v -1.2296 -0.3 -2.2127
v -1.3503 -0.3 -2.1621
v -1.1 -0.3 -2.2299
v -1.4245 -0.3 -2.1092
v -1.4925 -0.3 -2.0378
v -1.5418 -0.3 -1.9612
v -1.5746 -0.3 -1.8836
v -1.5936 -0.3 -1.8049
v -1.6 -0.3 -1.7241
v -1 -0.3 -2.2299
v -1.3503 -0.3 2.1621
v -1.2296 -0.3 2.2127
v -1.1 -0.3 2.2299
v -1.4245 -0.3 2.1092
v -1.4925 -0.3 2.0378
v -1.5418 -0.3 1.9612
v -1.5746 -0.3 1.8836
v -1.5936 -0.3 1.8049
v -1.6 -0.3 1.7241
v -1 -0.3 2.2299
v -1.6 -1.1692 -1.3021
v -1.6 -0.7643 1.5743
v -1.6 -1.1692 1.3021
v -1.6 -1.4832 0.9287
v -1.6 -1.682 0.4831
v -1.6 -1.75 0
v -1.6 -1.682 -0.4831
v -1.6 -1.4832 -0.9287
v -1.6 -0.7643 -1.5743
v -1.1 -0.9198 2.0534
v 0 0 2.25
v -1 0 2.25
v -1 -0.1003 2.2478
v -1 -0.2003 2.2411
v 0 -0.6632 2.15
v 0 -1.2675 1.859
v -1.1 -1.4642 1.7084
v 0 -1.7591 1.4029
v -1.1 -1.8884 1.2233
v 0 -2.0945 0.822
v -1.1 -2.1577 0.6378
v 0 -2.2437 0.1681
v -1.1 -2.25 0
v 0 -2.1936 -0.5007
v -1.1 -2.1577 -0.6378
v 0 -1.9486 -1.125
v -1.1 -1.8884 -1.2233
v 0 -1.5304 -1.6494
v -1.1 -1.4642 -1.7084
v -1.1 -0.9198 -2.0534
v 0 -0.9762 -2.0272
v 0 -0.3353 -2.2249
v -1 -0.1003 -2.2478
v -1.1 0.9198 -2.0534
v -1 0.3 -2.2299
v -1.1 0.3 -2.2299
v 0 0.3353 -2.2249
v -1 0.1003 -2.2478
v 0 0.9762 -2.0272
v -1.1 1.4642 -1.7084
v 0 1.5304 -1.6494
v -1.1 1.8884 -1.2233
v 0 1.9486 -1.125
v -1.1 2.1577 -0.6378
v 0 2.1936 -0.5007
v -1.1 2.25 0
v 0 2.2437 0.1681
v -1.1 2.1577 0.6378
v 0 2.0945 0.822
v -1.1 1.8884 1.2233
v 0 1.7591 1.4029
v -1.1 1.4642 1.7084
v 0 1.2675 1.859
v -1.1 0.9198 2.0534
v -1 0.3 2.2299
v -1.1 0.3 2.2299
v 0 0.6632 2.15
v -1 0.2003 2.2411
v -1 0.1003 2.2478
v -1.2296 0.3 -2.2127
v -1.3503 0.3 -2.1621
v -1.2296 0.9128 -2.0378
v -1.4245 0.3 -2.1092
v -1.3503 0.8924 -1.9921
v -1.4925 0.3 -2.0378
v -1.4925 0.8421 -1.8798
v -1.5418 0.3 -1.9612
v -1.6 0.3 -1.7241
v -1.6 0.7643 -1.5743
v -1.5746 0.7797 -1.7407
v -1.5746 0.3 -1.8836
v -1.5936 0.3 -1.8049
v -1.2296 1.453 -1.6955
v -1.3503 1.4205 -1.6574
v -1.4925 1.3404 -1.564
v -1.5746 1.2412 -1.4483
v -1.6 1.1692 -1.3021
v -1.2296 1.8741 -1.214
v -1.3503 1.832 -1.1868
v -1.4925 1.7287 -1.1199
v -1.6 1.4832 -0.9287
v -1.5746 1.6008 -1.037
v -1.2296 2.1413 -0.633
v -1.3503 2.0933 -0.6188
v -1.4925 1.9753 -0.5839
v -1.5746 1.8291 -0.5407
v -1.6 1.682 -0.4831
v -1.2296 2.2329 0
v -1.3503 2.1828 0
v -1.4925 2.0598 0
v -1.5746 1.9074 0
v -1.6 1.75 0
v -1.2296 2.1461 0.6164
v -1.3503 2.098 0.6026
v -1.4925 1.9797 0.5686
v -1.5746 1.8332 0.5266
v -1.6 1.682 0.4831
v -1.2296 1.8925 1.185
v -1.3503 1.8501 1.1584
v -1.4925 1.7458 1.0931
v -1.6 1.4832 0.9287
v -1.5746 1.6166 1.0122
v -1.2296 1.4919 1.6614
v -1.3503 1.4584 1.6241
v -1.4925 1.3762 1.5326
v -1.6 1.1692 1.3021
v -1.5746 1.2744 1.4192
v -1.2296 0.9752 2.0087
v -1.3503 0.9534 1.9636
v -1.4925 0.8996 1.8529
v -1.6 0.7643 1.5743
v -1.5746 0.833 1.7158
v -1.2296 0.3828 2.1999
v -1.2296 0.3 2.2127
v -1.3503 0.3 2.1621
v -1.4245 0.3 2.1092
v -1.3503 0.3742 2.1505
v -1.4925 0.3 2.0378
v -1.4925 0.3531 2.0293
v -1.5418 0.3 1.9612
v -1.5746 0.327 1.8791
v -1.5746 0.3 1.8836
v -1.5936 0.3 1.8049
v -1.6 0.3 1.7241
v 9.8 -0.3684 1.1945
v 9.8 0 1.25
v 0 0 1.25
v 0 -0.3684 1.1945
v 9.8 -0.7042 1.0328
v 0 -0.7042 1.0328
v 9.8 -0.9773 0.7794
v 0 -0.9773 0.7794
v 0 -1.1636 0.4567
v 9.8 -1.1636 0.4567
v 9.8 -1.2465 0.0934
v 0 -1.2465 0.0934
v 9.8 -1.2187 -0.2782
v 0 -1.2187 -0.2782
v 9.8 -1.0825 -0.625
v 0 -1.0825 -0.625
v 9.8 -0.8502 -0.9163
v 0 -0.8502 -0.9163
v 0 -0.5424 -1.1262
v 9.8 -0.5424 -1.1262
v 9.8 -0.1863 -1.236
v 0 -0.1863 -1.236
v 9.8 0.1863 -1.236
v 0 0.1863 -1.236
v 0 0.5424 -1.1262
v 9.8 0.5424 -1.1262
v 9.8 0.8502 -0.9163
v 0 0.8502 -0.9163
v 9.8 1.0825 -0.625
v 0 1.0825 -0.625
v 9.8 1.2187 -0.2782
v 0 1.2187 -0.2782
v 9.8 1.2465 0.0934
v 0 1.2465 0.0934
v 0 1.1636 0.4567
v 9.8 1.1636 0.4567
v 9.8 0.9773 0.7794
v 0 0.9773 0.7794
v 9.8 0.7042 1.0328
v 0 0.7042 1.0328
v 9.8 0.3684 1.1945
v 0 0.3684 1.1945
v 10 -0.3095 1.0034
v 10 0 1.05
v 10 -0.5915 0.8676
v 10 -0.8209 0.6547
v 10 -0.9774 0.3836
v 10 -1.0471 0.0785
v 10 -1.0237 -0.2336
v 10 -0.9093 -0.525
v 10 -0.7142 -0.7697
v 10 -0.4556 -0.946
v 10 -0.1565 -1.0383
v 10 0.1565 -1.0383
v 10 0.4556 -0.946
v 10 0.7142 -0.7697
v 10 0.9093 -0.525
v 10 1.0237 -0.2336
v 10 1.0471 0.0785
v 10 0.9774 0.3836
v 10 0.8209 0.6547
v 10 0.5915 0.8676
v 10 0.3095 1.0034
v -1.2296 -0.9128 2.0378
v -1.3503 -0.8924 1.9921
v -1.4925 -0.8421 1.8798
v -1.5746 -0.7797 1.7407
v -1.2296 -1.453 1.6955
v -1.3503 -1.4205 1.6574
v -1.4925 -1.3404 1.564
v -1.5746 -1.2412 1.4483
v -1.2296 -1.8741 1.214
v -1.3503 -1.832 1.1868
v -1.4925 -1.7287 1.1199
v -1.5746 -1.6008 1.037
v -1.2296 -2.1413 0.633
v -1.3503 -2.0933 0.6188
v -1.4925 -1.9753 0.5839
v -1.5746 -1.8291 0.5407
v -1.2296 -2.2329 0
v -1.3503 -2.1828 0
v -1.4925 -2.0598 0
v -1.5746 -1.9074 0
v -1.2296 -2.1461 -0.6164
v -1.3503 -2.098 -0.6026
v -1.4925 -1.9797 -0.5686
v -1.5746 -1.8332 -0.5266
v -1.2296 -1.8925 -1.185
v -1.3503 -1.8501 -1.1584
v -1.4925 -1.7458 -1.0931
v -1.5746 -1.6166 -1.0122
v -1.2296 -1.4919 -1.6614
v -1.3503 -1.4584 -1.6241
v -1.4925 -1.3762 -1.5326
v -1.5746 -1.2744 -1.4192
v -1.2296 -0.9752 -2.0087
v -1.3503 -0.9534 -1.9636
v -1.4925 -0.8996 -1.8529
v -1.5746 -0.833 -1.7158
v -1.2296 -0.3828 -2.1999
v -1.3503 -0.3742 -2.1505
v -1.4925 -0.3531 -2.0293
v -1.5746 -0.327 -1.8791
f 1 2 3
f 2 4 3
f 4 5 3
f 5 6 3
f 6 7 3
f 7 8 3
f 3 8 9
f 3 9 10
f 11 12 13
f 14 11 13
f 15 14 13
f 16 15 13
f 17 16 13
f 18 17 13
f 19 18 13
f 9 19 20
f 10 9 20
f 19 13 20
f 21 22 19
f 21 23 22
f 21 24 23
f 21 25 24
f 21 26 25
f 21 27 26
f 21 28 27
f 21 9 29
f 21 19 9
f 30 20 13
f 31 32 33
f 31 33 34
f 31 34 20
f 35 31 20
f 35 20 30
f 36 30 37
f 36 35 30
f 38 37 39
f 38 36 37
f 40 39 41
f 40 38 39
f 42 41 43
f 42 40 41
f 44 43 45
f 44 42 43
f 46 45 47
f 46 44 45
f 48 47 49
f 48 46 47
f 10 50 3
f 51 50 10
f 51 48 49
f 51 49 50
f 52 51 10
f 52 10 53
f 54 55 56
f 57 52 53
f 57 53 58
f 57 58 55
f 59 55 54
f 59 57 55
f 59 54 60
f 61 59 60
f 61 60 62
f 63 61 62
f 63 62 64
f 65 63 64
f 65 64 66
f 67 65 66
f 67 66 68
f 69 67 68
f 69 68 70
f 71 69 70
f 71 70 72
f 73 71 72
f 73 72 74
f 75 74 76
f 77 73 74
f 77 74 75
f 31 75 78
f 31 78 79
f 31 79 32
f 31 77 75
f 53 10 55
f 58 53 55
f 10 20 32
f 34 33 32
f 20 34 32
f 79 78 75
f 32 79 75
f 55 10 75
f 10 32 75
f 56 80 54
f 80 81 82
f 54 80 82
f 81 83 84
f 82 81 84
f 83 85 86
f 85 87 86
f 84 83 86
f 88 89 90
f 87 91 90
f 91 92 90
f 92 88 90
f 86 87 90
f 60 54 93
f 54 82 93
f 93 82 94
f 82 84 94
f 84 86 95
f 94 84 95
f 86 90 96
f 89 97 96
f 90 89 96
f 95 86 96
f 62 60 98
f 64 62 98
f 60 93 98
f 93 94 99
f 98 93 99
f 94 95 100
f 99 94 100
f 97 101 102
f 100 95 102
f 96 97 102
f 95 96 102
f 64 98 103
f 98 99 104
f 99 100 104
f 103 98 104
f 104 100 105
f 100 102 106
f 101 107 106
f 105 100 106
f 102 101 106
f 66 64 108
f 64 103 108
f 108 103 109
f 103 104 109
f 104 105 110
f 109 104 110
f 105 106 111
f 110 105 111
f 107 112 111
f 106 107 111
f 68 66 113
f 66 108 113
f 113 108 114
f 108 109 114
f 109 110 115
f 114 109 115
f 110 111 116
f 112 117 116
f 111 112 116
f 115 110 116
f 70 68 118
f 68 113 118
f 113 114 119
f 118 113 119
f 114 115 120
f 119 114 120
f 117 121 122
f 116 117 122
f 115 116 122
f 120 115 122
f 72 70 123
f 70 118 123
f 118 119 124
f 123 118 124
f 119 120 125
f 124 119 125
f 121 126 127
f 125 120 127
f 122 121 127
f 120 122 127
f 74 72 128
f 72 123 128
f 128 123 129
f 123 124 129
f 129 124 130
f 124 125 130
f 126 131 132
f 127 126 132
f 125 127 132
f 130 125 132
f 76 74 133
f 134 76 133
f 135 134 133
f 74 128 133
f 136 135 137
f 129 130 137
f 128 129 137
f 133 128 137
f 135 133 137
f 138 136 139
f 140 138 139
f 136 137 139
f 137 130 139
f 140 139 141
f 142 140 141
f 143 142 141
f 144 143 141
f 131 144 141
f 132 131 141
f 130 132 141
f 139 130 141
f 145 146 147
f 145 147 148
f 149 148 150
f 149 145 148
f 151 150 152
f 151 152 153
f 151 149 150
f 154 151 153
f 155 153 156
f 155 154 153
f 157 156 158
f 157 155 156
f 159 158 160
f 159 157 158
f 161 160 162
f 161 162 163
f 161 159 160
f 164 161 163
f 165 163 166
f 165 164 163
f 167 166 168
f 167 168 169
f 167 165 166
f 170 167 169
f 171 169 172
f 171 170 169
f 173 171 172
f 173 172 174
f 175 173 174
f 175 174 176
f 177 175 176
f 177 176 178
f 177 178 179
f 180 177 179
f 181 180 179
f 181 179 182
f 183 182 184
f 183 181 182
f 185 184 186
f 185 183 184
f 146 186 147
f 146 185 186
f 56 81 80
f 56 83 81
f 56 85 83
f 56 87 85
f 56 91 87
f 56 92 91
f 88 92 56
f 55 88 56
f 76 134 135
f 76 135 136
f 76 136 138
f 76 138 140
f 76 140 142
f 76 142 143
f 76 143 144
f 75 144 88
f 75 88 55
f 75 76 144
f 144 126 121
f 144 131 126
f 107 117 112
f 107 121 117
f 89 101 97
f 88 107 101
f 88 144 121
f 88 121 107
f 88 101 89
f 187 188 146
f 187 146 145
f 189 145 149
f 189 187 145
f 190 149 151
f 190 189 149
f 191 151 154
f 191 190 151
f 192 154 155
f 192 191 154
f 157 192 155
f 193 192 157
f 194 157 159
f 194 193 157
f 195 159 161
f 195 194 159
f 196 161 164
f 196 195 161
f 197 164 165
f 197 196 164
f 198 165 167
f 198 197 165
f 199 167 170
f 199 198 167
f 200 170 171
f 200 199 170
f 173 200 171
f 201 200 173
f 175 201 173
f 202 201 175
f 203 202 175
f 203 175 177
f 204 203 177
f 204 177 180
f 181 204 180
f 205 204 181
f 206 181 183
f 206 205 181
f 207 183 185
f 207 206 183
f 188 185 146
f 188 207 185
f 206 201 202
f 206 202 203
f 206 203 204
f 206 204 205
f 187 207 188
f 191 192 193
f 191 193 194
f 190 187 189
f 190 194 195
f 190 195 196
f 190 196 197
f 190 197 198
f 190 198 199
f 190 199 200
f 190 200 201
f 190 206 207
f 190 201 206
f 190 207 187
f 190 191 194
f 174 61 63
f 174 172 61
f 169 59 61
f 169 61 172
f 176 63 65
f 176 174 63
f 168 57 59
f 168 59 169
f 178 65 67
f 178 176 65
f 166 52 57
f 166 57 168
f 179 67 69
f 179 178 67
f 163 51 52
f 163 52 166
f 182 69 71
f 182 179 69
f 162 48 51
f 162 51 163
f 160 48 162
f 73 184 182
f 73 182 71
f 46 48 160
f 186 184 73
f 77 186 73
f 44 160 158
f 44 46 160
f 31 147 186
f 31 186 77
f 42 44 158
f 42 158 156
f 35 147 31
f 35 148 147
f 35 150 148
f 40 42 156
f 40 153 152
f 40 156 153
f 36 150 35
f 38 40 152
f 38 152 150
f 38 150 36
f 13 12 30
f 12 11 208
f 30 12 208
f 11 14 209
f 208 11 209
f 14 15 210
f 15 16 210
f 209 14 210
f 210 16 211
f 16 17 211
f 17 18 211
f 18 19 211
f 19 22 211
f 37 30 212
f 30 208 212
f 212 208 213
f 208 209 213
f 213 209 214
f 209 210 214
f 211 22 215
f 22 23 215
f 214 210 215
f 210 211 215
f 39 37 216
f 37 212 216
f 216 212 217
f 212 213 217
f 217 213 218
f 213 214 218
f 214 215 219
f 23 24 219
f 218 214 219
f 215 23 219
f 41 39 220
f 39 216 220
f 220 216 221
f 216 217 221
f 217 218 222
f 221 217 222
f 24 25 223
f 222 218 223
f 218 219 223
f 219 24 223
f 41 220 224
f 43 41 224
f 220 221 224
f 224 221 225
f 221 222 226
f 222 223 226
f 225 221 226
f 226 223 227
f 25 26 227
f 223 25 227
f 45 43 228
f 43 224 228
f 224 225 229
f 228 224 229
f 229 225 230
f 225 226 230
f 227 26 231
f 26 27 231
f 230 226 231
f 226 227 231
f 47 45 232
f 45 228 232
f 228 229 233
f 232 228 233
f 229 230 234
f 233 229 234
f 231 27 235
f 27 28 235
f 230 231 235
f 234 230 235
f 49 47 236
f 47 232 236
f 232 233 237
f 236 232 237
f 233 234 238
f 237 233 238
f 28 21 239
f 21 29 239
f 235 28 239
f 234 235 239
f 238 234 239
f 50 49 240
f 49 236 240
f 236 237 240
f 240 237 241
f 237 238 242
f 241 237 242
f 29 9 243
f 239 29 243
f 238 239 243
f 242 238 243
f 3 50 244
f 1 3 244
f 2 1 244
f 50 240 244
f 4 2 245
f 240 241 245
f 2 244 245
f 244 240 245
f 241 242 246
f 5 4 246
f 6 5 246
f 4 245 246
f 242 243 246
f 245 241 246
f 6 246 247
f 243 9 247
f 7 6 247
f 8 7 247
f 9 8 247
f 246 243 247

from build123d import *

# Parameters (mm, degrees)
CHANFREIN1_SIZE         = 0.2
CONG_1_R                = 0.5
ESQUISSE3_W             = 0.767853135
ESQUISSE3_H             = 0.6
ENL_V_MAT_EXTRU_1_DEPTH = 5


with BuildPart() as part:
    # Esquisse1 → Base-Révolution (revolve)
    with BuildSketch(Plane.XY, mode=Mode.PRIVATE) as base_r_volution_sk:
        Polygon((-1.6, 0), (-1.6, 2.25), (0, 2.25), (0, 1.25), (10, 1.25), (10, 0), align=None)
    revolve(base_r_volution_sk.sketch.rotate(Axis((-28.982684825, 0, 0), (1, 0, 0)), 90), axis=Axis((-28.982684825, 0, 0), (1, 0, 0)))

    # Chanfrein1
    chanfrein1_edges = [part.edges().sort_by_distance(p)[0] for p in [
        (10, 0, -1.25),
    ]]
    chamfer(chanfrein1_edges, length=CHANFREIN1_SIZE)

    # Congé1
    cong_1_edges = [part.edges().sort_by_distance(p)[0] for p in [
        (-1.6, 0, -2.25),
    ]]
    fillet(cong_1_edges, radius=CONG_1_R)

    # Esquisse3 → Enlèv. mat.-Extru.1 (cut, symmetric)
    with BuildSketch(Plane.XY):
        with Locations((-1.383926568, 0)):
            Rectangle(ESQUISSE3_W, ESQUISSE3_H)
    extrude(amount=ENL_V_MAT_EXTRU_1_DEPTH, both=True, mode=Mode.SUBTRACT)


solid = part.part
